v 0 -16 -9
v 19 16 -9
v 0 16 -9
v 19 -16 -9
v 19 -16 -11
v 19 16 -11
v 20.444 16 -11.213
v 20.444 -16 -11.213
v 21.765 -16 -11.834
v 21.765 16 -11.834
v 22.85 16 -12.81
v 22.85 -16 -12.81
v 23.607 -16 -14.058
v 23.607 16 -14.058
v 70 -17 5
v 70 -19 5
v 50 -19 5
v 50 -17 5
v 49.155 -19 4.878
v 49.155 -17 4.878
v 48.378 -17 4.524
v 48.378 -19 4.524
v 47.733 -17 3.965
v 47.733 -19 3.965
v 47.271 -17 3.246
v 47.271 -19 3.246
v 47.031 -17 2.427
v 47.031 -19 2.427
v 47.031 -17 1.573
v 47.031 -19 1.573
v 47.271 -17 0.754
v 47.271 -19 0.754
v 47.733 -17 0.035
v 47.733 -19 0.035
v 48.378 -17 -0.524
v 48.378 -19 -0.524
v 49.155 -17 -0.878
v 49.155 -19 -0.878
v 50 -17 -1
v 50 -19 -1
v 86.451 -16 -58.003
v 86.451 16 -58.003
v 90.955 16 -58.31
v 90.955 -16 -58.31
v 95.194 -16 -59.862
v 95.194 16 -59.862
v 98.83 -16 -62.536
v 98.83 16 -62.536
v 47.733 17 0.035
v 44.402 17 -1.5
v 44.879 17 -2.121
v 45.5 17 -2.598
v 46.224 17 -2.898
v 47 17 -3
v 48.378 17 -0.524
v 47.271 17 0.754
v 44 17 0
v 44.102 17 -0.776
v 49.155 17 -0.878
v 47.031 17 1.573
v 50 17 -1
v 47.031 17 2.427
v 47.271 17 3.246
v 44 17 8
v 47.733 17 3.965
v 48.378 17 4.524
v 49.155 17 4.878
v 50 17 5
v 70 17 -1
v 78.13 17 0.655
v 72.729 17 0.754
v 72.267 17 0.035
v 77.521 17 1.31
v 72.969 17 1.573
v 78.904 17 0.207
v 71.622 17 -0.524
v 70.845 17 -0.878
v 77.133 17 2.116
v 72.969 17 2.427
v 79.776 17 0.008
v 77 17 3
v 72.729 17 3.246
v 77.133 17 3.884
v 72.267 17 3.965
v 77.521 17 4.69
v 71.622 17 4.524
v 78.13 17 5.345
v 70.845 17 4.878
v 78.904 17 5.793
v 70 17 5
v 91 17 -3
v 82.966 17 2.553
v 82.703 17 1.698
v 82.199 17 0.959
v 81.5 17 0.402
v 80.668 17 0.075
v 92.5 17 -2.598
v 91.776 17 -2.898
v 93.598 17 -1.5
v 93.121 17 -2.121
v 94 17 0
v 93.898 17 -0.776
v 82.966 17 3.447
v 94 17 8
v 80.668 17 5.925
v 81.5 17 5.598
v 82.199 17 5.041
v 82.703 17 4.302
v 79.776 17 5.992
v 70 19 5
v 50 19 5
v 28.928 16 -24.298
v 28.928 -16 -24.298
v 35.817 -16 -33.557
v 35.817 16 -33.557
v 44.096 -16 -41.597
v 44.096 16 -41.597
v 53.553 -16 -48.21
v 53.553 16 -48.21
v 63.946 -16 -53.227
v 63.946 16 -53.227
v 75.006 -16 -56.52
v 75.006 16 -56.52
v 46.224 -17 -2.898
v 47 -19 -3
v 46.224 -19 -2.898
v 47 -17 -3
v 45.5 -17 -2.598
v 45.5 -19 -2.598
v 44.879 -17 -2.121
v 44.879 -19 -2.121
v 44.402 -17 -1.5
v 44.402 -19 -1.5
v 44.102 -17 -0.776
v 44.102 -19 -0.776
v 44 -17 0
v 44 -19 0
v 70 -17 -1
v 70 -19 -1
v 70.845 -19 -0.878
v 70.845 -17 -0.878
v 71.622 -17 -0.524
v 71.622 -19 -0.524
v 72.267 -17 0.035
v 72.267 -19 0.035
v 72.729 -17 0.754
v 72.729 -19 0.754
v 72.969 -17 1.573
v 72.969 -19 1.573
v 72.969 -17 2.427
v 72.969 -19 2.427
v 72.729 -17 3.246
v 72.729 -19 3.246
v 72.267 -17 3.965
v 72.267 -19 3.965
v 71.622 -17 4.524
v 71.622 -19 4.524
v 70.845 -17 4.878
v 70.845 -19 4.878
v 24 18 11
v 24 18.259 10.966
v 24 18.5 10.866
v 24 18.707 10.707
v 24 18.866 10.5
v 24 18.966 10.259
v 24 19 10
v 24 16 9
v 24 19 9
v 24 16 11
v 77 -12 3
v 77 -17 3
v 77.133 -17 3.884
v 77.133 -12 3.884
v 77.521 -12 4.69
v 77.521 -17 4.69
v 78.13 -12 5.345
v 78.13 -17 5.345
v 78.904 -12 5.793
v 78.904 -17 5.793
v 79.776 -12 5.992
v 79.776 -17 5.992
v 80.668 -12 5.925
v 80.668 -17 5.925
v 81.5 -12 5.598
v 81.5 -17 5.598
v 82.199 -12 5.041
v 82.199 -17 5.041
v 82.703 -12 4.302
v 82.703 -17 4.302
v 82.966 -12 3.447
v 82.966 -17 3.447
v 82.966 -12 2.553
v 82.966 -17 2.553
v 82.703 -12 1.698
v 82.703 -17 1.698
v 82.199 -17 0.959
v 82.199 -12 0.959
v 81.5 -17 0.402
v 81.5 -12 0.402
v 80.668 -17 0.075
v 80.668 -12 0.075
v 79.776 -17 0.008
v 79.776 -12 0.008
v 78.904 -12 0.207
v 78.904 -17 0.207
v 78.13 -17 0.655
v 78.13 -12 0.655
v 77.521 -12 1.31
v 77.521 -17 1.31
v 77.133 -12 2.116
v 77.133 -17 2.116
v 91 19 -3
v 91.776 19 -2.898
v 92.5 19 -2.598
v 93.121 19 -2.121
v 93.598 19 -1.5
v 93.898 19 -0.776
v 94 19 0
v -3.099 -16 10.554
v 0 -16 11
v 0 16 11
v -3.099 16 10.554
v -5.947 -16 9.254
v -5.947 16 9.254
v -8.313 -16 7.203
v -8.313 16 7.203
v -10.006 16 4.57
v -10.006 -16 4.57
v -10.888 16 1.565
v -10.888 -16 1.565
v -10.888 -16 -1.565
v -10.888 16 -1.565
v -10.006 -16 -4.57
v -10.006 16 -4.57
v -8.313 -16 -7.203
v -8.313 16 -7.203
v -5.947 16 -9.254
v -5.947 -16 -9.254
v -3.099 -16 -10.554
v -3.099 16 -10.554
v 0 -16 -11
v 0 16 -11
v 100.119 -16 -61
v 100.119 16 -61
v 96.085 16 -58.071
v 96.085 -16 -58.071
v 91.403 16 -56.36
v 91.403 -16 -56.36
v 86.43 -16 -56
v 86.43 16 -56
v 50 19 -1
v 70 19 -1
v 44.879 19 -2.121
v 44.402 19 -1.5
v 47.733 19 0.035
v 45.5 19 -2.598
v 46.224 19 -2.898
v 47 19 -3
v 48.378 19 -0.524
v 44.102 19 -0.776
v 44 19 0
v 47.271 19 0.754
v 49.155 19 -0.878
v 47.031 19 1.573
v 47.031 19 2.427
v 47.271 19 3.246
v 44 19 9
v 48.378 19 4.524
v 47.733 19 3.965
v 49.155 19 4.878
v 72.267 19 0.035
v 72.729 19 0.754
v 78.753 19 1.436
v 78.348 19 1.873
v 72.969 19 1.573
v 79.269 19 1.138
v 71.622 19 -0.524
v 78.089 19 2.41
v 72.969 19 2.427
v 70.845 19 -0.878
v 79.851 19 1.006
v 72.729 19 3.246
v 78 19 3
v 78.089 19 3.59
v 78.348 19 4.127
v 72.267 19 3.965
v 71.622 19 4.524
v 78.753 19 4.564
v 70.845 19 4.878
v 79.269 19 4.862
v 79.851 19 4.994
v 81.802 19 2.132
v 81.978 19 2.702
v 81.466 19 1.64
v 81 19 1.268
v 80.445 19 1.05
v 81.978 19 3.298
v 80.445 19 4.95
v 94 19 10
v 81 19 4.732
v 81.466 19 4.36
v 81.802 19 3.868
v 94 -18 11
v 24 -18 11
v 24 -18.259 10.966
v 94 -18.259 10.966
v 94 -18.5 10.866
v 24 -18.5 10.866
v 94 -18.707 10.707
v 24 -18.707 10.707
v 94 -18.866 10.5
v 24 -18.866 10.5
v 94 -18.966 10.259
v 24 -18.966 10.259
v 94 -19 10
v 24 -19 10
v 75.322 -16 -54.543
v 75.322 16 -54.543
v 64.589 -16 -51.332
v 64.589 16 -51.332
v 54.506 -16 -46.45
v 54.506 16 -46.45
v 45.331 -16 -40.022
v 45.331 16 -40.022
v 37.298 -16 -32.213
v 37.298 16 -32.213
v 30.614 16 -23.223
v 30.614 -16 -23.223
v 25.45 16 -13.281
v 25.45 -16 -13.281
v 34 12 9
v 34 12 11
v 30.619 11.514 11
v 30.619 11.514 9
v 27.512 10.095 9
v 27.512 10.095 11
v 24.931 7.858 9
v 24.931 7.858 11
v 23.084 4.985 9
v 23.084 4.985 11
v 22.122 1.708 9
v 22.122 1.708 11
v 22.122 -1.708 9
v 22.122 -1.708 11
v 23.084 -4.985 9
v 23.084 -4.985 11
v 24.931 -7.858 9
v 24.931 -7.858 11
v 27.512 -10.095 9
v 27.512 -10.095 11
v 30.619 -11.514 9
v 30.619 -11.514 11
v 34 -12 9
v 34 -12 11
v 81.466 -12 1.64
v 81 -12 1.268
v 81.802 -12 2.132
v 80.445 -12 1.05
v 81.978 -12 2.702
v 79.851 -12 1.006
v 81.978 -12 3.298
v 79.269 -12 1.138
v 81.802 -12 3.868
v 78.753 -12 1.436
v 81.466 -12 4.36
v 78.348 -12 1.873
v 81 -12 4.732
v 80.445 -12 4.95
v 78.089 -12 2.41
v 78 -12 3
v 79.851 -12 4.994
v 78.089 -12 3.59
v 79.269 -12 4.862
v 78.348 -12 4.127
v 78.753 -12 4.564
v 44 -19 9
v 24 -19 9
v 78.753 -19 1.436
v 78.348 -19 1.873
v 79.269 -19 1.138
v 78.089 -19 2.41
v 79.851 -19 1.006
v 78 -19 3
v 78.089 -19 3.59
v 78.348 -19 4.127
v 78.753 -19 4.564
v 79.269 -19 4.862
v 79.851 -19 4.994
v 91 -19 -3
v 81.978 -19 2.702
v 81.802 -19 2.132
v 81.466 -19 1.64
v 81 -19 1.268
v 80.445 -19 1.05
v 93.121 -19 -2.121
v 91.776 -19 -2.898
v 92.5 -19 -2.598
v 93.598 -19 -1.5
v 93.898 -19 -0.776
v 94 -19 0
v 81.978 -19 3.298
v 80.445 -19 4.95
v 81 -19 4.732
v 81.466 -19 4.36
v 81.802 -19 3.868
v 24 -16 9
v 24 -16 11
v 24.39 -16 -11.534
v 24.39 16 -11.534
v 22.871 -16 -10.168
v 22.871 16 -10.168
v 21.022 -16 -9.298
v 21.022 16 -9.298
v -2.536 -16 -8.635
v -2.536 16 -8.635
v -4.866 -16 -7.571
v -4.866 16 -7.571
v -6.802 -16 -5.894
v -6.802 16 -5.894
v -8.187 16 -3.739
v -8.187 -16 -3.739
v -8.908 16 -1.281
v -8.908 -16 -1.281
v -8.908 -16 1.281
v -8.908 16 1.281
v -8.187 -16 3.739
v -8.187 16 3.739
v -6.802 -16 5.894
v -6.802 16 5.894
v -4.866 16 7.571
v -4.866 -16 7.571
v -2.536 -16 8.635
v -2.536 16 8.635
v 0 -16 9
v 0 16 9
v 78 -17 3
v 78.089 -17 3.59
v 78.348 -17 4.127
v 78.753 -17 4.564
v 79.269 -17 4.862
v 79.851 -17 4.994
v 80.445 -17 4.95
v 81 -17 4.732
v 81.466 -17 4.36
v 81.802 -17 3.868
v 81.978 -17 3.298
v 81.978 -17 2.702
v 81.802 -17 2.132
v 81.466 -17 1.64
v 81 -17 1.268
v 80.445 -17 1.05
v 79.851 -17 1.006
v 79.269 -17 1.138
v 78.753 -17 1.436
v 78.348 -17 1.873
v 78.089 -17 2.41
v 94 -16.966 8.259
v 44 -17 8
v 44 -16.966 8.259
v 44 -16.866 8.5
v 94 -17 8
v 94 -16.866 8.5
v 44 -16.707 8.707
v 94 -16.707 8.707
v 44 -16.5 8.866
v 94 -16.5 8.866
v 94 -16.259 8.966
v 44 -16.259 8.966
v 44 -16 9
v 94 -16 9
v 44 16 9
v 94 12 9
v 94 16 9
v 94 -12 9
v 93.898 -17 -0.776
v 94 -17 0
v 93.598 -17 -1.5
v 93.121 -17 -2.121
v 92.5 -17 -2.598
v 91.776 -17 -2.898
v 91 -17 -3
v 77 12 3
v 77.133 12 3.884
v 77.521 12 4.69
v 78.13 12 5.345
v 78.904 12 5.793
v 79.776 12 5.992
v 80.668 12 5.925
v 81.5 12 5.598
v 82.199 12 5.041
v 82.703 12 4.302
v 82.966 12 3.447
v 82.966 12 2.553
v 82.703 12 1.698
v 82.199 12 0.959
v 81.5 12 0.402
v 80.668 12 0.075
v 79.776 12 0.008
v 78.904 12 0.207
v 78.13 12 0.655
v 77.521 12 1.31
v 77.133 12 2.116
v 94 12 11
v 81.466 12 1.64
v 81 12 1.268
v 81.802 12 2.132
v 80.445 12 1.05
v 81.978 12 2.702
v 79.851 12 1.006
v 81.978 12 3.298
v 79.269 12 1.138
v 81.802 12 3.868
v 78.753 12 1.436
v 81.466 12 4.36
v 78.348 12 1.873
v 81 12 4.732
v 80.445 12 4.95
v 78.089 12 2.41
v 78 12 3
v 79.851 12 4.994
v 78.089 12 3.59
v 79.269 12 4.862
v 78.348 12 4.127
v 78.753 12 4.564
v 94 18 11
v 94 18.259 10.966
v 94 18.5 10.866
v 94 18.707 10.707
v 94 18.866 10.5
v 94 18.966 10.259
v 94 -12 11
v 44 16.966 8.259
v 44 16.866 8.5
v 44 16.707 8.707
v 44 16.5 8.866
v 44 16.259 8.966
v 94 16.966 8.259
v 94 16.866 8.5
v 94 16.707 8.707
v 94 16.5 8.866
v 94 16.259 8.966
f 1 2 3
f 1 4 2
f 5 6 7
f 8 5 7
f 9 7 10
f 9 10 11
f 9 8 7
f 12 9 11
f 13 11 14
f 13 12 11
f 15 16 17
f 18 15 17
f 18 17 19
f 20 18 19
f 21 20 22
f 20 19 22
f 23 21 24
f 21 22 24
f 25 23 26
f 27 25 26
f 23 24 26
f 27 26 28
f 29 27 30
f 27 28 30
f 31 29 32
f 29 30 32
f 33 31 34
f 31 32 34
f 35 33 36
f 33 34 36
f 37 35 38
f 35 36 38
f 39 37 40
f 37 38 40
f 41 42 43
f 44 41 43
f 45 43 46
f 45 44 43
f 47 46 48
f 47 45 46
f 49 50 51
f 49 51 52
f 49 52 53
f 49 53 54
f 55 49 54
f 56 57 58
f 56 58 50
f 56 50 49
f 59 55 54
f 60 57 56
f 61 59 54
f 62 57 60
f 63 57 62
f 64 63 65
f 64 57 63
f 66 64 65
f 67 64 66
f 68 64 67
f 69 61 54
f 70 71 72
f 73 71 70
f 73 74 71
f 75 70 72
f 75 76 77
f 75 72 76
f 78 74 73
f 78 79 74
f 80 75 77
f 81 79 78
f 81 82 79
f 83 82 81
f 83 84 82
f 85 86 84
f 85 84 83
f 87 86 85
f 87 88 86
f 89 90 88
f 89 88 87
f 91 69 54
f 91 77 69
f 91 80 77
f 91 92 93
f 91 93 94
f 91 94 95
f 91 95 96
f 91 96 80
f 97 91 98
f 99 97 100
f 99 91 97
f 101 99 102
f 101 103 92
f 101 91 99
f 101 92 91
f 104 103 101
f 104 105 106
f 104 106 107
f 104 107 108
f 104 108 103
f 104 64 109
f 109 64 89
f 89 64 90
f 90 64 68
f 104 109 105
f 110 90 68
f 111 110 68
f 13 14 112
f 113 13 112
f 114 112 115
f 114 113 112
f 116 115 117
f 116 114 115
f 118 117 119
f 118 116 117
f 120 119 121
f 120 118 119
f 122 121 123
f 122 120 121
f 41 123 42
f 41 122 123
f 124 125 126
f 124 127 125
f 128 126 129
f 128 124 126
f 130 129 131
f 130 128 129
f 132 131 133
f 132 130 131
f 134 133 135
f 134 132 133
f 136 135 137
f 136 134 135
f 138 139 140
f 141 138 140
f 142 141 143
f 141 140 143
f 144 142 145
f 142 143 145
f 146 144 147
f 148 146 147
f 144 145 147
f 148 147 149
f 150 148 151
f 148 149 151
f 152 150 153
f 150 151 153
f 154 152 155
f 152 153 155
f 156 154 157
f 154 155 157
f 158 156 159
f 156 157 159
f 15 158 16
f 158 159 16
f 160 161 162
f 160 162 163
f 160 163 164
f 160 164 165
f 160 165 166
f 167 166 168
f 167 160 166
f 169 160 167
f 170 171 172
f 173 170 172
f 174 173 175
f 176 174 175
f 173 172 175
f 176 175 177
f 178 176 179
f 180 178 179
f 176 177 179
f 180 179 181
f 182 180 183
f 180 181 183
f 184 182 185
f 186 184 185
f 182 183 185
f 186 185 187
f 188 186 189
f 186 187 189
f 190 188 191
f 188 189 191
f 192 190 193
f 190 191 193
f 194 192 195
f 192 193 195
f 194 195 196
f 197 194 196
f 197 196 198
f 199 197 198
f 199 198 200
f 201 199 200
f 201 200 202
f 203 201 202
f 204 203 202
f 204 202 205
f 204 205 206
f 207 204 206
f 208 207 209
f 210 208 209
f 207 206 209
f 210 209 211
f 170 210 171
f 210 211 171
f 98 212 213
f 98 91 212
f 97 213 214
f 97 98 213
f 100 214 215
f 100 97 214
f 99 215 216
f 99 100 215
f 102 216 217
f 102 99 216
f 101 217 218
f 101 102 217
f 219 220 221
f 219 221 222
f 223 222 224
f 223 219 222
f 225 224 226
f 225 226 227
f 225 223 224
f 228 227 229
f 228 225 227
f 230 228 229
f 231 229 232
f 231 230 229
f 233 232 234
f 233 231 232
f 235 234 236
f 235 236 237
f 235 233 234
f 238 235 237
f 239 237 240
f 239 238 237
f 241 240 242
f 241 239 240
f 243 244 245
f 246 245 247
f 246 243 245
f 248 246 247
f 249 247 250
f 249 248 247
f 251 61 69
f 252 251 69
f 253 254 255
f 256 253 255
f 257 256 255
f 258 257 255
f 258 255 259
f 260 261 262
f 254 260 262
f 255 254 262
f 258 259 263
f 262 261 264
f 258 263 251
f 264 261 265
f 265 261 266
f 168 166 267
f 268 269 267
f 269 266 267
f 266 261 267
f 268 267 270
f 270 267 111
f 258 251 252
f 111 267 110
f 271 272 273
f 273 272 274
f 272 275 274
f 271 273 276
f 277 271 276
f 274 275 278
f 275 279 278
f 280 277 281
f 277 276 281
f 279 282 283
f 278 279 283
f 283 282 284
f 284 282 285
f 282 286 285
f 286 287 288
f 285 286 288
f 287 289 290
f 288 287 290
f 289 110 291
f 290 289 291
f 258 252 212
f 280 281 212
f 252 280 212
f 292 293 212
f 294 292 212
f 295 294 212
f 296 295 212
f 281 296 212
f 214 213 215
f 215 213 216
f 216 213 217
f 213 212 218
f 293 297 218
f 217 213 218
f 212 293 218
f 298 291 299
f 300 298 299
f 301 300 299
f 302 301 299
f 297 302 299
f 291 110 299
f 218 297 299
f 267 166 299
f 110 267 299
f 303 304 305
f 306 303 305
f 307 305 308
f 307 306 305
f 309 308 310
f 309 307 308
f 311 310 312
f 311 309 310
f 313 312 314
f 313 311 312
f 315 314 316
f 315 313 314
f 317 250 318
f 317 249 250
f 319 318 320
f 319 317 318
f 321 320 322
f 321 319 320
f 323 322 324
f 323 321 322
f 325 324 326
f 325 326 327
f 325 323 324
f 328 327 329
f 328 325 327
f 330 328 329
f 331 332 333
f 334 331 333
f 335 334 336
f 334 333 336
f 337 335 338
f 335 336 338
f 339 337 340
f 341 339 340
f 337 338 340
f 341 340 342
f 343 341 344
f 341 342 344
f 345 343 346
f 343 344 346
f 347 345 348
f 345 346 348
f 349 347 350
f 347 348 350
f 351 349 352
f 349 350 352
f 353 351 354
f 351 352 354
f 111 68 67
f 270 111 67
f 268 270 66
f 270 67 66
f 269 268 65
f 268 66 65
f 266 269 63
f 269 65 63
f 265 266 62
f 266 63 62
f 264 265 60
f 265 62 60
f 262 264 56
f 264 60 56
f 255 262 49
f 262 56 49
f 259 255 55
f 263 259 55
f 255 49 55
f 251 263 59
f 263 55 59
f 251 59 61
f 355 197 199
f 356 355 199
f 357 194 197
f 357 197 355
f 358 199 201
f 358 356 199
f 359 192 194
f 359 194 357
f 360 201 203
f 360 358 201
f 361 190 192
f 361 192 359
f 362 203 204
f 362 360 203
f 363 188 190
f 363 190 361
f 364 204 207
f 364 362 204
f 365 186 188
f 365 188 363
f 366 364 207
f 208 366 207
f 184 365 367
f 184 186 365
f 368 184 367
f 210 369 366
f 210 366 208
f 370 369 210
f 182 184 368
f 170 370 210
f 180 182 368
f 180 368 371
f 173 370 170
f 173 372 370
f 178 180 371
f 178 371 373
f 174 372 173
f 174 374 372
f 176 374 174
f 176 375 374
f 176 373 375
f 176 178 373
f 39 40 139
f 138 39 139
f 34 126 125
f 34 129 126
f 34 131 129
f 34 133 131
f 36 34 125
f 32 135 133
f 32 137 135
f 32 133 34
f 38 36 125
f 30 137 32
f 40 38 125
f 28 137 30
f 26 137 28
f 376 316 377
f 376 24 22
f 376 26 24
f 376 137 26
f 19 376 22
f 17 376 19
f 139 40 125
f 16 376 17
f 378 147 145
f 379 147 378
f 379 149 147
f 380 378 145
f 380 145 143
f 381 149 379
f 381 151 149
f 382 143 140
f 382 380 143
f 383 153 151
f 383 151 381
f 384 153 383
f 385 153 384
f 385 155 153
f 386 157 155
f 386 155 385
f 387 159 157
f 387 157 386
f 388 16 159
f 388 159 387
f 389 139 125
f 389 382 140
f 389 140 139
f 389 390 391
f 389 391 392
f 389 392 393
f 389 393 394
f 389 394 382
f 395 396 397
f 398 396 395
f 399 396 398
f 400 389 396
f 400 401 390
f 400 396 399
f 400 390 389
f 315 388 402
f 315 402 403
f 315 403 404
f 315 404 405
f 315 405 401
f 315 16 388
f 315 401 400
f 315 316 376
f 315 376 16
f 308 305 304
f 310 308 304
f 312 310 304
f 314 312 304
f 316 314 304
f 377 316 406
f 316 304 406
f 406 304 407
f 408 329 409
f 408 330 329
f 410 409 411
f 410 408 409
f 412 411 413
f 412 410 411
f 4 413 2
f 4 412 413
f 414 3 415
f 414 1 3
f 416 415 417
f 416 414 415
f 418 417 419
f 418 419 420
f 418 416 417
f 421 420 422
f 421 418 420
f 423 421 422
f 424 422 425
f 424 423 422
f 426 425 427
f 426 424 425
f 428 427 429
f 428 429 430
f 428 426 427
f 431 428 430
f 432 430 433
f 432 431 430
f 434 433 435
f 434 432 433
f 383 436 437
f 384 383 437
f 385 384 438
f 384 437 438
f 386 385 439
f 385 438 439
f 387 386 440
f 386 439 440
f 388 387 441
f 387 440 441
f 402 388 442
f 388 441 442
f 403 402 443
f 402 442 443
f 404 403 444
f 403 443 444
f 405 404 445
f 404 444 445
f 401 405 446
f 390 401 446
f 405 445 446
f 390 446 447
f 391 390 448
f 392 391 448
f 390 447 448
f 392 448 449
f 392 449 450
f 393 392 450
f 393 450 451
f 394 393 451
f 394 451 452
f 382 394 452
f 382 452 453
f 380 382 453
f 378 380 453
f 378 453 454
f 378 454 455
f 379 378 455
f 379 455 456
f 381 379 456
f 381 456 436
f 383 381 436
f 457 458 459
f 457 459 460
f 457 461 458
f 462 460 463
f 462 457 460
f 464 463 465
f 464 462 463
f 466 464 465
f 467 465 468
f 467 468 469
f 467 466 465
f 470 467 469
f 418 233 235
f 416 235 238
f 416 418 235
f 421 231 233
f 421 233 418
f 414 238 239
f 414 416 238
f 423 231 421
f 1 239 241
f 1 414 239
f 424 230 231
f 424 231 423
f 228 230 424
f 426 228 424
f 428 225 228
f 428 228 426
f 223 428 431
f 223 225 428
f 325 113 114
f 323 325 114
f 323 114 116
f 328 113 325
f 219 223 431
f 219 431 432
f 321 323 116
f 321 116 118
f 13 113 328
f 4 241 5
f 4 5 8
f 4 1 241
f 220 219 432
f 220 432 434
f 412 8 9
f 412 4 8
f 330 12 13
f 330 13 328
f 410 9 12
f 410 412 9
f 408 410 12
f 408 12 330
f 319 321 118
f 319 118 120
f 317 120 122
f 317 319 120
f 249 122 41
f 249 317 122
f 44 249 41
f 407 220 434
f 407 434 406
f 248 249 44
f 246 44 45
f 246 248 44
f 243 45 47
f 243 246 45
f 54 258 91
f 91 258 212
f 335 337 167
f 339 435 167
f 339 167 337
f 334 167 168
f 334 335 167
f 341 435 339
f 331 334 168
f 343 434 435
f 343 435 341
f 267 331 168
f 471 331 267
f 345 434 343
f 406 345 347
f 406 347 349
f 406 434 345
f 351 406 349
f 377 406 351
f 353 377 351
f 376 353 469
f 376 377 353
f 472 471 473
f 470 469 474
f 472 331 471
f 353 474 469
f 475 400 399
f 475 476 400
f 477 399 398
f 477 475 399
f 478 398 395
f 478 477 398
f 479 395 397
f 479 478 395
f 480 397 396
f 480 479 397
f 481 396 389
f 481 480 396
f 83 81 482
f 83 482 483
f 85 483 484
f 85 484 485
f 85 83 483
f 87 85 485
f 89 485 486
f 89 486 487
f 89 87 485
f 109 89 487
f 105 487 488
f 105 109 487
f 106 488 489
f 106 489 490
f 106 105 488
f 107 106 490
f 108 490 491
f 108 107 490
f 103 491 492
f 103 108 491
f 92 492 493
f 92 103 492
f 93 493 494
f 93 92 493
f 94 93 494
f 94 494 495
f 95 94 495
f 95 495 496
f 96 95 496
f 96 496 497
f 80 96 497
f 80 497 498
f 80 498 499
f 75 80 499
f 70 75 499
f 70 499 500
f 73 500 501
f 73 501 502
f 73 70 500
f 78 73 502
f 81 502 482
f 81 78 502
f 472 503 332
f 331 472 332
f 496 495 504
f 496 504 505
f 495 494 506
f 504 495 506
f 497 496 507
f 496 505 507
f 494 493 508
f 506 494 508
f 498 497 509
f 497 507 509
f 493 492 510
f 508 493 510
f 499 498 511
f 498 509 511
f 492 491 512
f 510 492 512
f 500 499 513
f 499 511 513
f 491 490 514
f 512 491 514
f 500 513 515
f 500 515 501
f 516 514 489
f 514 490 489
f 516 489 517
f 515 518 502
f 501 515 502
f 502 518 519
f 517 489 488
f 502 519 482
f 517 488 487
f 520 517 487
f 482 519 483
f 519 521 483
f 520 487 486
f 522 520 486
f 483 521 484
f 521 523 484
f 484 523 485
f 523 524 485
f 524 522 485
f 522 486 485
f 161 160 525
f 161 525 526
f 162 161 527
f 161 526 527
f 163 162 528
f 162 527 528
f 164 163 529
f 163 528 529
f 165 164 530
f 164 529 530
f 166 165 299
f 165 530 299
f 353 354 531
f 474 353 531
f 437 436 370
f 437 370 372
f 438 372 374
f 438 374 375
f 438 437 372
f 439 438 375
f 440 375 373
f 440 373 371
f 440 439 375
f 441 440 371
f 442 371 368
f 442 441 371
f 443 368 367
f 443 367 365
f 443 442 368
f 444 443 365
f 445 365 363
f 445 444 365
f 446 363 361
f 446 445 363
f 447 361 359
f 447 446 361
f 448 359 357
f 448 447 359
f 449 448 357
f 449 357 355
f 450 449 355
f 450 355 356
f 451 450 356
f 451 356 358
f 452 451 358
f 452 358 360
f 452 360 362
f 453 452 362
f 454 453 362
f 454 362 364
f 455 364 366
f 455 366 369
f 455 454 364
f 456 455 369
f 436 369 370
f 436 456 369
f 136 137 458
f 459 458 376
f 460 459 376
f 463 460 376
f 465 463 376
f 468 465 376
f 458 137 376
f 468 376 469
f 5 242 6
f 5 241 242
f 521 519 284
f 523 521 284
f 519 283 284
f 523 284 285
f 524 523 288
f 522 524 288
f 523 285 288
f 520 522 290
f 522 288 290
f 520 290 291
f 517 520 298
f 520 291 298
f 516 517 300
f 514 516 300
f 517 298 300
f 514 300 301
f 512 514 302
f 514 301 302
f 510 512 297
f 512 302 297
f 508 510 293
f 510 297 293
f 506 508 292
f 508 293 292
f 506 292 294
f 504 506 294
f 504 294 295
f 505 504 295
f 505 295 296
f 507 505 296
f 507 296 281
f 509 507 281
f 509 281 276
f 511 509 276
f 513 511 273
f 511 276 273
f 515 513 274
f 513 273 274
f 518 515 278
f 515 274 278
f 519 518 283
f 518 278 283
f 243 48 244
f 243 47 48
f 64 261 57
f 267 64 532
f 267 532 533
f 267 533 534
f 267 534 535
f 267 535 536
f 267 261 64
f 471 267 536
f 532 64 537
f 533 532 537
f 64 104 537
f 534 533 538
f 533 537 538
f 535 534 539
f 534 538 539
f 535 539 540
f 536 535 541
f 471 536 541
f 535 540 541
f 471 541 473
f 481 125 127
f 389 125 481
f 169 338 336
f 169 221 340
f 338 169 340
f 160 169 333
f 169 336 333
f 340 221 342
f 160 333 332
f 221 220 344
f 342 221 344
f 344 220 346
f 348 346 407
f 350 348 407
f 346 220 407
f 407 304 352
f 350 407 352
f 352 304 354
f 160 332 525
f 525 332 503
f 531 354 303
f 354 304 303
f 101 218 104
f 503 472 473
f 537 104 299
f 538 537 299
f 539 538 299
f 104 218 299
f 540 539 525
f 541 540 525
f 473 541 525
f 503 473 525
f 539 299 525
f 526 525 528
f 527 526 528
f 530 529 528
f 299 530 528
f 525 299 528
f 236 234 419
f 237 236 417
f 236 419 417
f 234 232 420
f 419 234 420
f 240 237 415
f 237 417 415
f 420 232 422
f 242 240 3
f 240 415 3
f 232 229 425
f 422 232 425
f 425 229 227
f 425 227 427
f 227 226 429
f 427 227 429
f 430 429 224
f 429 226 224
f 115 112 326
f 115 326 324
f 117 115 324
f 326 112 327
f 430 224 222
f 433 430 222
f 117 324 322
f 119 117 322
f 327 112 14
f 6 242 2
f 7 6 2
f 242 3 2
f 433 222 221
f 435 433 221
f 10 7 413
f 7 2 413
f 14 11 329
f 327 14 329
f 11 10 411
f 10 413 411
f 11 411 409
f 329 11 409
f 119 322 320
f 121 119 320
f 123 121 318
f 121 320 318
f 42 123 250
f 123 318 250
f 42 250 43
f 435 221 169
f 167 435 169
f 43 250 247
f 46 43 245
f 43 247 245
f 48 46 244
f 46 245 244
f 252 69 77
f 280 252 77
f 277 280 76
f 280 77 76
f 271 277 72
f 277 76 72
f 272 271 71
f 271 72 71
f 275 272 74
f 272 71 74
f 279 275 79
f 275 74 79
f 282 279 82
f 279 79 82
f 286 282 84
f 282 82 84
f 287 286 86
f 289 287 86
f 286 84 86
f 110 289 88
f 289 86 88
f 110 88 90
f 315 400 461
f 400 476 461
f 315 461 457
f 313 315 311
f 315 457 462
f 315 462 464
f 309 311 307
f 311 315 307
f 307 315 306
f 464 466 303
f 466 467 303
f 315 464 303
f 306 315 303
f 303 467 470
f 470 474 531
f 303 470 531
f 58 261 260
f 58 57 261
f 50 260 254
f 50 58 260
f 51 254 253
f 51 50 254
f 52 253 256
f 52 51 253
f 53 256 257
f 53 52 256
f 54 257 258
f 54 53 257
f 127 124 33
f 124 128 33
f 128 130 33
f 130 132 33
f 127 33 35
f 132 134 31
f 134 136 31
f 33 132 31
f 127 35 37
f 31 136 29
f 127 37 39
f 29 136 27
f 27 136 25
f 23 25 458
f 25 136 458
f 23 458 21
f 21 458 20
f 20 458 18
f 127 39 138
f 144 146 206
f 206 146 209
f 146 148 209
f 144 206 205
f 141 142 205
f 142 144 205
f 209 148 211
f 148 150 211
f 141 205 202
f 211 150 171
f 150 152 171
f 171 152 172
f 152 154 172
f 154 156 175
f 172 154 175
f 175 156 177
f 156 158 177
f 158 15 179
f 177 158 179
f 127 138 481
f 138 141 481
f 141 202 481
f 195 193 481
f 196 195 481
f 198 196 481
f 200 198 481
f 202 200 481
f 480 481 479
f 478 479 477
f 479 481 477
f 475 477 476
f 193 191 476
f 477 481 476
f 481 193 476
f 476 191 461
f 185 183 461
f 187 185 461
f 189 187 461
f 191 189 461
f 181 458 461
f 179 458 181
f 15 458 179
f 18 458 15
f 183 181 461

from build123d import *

# Parameters (mm, degrees)
F1_DEPTH  = 16
F2_W      = 70
F2_H      = 3
F3_DEPTH  = 2
F4_W      = 50
F4_H      = 12
F5_DEPTH  = 2
F6_R      = 1
F9_DEPTH  = 2
F11_DEPTH = 38.001
F13_D     = 4
F14_R     = 3
F14_R_2   = 2
F15_DEPTH = 5
F16_R     = 3


# Not quite as in the source:
# - a pattern or mirror of a feature is missing from the dataset's text; its kind, count and spacing are read off the source's solid


with BuildPart() as f1:
    # F0 (on Front) → F1 (new body)
    with BuildSketch(Plane.XZ):
        with BuildLine():
            Line((94, 11), (0, 11))
            ThreePointArc((0, 11), (-11, 0), (0, -11))
            Line((0, -11), (19, -11))
            ThreePointArc((19, -11), (21.7648271935, -11.8339790459), (23.607331209, -14.0577077639))
            ThreePointArc((23.607331209, -14.0577077639), (48.6917034204, -45.0930519948), (86.4506679072, -58.0034711071))
            ThreePointArc((86.4506679072, -58.0034711071), (93.1291053538, -58.9355091014), (98.8304523125, -62.5361846502))
            Line((98.8304523125, -62.5361846502), (100.1194642859, -61))
            ThreePointArc((100.1194642859, -61), (93.803453137, -57.0525770858), (86.4301074938, -56))
            ThreePointArc((86.4301074938, -56), (49.7895156694, -43.4202136678), (25.4502636926, -13.2807908695))
            ThreePointArc((25.4502636926, -13.2807908695), (22.8707580709, -10.1675706642), (19, -9))
            Line((19, -9), (0, -9))
            ThreePointArc((0, -9), (-9, 0), (0, 9))
            Line((0, 9), (94, 9))
            Line((94, 9), (94, 11))
        make_face()
    extrude(amount=F1_DEPTH)

    # F2 (on face) → F3 (join)
    with BuildSketch(Plane.XY.offset(11)):
        with Locations((59, -17.5)):
            Rectangle(F2_W, F2_H)
    extrude(amount=-F3_DEPTH)

    # F4 (on face) → F5 (join)
    with BuildSketch(Plane.XZ.offset(19)):
        with Locations((69, 3)):
            Rectangle(F4_W, F4_H)
    extrude(amount=-F5_DEPTH)

    # F6
    f6_edges = [f1.edges().sort_by_distance(p)[0] for p in [
        (59, -19, 11),
        (69, -17, 9),
    ]]
    fillet(f6_edges, radius=F6_R)

    # F7: F1 across plane


with BuildPart() as f1_1:
    add(f1.part)
    add(f1.part.mirror(Plane.XZ))

    # F8 (on face) → F9 (cut)
    with BuildSketch(Plane.XY.offset(11)):
        with BuildLine():
            Line((94, 12), (34, 12))
            ThreePointArc((34, 12), (22, 0), (34, -12))
            Line((34, -12), (94, -12))
            Line((94, -12), (94, 12))
        make_face()
    extrude(amount=-F9_DEPTH, mode=Mode.SUBTRACT)

    # F10 (on face) → F11 (cut, through all)
    with BuildSketch(Plane.XZ.offset(19)):
        with BuildLine():
            ThreePointArc((50, 5), (47, 2), (50, -1))
            Line((50, -1), (70, -1))
            ThreePointArc((70, -1), (73, 2), (70, 5))
            Line((70, 5), (50, 5))
        make_face()
    extrude(amount=-F11_DEPTH, mode=Mode.SUBTRACT)

    # F13 (through all)
    with Locations(Plane.XZ.offset(19)):
        with Locations((80, 3)):
            Hole(F13_D / 2)

    # F14 (on face) → F15 (join)
    with BuildSketch(Plane(origin=(0, -17, 0), x_dir=(-1, 0, 0), z_dir=(0, 1, 0))):
        with Locations((-80, 3)):
            Circle(F14_R)
        with Locations((-80, 3)):
            Circle(F14_R_2, mode=Mode.SUBTRACT)
    f15 = extrude(amount=F15_DEPTH)

    # F15_copies: F15 across plane
    add(f15.mirror(Plane.ZX))

    # F16
    f16_edges = [f1_1.edges().sort_by_distance(p)[0] for p in [
        (94, 18, -3),
        (44, 18, -3),
        (44, -18, -3),
        (94, -18, -3),
    ]]
    fillet(f16_edges, radius=F16_R)


solid = f1_1.part
